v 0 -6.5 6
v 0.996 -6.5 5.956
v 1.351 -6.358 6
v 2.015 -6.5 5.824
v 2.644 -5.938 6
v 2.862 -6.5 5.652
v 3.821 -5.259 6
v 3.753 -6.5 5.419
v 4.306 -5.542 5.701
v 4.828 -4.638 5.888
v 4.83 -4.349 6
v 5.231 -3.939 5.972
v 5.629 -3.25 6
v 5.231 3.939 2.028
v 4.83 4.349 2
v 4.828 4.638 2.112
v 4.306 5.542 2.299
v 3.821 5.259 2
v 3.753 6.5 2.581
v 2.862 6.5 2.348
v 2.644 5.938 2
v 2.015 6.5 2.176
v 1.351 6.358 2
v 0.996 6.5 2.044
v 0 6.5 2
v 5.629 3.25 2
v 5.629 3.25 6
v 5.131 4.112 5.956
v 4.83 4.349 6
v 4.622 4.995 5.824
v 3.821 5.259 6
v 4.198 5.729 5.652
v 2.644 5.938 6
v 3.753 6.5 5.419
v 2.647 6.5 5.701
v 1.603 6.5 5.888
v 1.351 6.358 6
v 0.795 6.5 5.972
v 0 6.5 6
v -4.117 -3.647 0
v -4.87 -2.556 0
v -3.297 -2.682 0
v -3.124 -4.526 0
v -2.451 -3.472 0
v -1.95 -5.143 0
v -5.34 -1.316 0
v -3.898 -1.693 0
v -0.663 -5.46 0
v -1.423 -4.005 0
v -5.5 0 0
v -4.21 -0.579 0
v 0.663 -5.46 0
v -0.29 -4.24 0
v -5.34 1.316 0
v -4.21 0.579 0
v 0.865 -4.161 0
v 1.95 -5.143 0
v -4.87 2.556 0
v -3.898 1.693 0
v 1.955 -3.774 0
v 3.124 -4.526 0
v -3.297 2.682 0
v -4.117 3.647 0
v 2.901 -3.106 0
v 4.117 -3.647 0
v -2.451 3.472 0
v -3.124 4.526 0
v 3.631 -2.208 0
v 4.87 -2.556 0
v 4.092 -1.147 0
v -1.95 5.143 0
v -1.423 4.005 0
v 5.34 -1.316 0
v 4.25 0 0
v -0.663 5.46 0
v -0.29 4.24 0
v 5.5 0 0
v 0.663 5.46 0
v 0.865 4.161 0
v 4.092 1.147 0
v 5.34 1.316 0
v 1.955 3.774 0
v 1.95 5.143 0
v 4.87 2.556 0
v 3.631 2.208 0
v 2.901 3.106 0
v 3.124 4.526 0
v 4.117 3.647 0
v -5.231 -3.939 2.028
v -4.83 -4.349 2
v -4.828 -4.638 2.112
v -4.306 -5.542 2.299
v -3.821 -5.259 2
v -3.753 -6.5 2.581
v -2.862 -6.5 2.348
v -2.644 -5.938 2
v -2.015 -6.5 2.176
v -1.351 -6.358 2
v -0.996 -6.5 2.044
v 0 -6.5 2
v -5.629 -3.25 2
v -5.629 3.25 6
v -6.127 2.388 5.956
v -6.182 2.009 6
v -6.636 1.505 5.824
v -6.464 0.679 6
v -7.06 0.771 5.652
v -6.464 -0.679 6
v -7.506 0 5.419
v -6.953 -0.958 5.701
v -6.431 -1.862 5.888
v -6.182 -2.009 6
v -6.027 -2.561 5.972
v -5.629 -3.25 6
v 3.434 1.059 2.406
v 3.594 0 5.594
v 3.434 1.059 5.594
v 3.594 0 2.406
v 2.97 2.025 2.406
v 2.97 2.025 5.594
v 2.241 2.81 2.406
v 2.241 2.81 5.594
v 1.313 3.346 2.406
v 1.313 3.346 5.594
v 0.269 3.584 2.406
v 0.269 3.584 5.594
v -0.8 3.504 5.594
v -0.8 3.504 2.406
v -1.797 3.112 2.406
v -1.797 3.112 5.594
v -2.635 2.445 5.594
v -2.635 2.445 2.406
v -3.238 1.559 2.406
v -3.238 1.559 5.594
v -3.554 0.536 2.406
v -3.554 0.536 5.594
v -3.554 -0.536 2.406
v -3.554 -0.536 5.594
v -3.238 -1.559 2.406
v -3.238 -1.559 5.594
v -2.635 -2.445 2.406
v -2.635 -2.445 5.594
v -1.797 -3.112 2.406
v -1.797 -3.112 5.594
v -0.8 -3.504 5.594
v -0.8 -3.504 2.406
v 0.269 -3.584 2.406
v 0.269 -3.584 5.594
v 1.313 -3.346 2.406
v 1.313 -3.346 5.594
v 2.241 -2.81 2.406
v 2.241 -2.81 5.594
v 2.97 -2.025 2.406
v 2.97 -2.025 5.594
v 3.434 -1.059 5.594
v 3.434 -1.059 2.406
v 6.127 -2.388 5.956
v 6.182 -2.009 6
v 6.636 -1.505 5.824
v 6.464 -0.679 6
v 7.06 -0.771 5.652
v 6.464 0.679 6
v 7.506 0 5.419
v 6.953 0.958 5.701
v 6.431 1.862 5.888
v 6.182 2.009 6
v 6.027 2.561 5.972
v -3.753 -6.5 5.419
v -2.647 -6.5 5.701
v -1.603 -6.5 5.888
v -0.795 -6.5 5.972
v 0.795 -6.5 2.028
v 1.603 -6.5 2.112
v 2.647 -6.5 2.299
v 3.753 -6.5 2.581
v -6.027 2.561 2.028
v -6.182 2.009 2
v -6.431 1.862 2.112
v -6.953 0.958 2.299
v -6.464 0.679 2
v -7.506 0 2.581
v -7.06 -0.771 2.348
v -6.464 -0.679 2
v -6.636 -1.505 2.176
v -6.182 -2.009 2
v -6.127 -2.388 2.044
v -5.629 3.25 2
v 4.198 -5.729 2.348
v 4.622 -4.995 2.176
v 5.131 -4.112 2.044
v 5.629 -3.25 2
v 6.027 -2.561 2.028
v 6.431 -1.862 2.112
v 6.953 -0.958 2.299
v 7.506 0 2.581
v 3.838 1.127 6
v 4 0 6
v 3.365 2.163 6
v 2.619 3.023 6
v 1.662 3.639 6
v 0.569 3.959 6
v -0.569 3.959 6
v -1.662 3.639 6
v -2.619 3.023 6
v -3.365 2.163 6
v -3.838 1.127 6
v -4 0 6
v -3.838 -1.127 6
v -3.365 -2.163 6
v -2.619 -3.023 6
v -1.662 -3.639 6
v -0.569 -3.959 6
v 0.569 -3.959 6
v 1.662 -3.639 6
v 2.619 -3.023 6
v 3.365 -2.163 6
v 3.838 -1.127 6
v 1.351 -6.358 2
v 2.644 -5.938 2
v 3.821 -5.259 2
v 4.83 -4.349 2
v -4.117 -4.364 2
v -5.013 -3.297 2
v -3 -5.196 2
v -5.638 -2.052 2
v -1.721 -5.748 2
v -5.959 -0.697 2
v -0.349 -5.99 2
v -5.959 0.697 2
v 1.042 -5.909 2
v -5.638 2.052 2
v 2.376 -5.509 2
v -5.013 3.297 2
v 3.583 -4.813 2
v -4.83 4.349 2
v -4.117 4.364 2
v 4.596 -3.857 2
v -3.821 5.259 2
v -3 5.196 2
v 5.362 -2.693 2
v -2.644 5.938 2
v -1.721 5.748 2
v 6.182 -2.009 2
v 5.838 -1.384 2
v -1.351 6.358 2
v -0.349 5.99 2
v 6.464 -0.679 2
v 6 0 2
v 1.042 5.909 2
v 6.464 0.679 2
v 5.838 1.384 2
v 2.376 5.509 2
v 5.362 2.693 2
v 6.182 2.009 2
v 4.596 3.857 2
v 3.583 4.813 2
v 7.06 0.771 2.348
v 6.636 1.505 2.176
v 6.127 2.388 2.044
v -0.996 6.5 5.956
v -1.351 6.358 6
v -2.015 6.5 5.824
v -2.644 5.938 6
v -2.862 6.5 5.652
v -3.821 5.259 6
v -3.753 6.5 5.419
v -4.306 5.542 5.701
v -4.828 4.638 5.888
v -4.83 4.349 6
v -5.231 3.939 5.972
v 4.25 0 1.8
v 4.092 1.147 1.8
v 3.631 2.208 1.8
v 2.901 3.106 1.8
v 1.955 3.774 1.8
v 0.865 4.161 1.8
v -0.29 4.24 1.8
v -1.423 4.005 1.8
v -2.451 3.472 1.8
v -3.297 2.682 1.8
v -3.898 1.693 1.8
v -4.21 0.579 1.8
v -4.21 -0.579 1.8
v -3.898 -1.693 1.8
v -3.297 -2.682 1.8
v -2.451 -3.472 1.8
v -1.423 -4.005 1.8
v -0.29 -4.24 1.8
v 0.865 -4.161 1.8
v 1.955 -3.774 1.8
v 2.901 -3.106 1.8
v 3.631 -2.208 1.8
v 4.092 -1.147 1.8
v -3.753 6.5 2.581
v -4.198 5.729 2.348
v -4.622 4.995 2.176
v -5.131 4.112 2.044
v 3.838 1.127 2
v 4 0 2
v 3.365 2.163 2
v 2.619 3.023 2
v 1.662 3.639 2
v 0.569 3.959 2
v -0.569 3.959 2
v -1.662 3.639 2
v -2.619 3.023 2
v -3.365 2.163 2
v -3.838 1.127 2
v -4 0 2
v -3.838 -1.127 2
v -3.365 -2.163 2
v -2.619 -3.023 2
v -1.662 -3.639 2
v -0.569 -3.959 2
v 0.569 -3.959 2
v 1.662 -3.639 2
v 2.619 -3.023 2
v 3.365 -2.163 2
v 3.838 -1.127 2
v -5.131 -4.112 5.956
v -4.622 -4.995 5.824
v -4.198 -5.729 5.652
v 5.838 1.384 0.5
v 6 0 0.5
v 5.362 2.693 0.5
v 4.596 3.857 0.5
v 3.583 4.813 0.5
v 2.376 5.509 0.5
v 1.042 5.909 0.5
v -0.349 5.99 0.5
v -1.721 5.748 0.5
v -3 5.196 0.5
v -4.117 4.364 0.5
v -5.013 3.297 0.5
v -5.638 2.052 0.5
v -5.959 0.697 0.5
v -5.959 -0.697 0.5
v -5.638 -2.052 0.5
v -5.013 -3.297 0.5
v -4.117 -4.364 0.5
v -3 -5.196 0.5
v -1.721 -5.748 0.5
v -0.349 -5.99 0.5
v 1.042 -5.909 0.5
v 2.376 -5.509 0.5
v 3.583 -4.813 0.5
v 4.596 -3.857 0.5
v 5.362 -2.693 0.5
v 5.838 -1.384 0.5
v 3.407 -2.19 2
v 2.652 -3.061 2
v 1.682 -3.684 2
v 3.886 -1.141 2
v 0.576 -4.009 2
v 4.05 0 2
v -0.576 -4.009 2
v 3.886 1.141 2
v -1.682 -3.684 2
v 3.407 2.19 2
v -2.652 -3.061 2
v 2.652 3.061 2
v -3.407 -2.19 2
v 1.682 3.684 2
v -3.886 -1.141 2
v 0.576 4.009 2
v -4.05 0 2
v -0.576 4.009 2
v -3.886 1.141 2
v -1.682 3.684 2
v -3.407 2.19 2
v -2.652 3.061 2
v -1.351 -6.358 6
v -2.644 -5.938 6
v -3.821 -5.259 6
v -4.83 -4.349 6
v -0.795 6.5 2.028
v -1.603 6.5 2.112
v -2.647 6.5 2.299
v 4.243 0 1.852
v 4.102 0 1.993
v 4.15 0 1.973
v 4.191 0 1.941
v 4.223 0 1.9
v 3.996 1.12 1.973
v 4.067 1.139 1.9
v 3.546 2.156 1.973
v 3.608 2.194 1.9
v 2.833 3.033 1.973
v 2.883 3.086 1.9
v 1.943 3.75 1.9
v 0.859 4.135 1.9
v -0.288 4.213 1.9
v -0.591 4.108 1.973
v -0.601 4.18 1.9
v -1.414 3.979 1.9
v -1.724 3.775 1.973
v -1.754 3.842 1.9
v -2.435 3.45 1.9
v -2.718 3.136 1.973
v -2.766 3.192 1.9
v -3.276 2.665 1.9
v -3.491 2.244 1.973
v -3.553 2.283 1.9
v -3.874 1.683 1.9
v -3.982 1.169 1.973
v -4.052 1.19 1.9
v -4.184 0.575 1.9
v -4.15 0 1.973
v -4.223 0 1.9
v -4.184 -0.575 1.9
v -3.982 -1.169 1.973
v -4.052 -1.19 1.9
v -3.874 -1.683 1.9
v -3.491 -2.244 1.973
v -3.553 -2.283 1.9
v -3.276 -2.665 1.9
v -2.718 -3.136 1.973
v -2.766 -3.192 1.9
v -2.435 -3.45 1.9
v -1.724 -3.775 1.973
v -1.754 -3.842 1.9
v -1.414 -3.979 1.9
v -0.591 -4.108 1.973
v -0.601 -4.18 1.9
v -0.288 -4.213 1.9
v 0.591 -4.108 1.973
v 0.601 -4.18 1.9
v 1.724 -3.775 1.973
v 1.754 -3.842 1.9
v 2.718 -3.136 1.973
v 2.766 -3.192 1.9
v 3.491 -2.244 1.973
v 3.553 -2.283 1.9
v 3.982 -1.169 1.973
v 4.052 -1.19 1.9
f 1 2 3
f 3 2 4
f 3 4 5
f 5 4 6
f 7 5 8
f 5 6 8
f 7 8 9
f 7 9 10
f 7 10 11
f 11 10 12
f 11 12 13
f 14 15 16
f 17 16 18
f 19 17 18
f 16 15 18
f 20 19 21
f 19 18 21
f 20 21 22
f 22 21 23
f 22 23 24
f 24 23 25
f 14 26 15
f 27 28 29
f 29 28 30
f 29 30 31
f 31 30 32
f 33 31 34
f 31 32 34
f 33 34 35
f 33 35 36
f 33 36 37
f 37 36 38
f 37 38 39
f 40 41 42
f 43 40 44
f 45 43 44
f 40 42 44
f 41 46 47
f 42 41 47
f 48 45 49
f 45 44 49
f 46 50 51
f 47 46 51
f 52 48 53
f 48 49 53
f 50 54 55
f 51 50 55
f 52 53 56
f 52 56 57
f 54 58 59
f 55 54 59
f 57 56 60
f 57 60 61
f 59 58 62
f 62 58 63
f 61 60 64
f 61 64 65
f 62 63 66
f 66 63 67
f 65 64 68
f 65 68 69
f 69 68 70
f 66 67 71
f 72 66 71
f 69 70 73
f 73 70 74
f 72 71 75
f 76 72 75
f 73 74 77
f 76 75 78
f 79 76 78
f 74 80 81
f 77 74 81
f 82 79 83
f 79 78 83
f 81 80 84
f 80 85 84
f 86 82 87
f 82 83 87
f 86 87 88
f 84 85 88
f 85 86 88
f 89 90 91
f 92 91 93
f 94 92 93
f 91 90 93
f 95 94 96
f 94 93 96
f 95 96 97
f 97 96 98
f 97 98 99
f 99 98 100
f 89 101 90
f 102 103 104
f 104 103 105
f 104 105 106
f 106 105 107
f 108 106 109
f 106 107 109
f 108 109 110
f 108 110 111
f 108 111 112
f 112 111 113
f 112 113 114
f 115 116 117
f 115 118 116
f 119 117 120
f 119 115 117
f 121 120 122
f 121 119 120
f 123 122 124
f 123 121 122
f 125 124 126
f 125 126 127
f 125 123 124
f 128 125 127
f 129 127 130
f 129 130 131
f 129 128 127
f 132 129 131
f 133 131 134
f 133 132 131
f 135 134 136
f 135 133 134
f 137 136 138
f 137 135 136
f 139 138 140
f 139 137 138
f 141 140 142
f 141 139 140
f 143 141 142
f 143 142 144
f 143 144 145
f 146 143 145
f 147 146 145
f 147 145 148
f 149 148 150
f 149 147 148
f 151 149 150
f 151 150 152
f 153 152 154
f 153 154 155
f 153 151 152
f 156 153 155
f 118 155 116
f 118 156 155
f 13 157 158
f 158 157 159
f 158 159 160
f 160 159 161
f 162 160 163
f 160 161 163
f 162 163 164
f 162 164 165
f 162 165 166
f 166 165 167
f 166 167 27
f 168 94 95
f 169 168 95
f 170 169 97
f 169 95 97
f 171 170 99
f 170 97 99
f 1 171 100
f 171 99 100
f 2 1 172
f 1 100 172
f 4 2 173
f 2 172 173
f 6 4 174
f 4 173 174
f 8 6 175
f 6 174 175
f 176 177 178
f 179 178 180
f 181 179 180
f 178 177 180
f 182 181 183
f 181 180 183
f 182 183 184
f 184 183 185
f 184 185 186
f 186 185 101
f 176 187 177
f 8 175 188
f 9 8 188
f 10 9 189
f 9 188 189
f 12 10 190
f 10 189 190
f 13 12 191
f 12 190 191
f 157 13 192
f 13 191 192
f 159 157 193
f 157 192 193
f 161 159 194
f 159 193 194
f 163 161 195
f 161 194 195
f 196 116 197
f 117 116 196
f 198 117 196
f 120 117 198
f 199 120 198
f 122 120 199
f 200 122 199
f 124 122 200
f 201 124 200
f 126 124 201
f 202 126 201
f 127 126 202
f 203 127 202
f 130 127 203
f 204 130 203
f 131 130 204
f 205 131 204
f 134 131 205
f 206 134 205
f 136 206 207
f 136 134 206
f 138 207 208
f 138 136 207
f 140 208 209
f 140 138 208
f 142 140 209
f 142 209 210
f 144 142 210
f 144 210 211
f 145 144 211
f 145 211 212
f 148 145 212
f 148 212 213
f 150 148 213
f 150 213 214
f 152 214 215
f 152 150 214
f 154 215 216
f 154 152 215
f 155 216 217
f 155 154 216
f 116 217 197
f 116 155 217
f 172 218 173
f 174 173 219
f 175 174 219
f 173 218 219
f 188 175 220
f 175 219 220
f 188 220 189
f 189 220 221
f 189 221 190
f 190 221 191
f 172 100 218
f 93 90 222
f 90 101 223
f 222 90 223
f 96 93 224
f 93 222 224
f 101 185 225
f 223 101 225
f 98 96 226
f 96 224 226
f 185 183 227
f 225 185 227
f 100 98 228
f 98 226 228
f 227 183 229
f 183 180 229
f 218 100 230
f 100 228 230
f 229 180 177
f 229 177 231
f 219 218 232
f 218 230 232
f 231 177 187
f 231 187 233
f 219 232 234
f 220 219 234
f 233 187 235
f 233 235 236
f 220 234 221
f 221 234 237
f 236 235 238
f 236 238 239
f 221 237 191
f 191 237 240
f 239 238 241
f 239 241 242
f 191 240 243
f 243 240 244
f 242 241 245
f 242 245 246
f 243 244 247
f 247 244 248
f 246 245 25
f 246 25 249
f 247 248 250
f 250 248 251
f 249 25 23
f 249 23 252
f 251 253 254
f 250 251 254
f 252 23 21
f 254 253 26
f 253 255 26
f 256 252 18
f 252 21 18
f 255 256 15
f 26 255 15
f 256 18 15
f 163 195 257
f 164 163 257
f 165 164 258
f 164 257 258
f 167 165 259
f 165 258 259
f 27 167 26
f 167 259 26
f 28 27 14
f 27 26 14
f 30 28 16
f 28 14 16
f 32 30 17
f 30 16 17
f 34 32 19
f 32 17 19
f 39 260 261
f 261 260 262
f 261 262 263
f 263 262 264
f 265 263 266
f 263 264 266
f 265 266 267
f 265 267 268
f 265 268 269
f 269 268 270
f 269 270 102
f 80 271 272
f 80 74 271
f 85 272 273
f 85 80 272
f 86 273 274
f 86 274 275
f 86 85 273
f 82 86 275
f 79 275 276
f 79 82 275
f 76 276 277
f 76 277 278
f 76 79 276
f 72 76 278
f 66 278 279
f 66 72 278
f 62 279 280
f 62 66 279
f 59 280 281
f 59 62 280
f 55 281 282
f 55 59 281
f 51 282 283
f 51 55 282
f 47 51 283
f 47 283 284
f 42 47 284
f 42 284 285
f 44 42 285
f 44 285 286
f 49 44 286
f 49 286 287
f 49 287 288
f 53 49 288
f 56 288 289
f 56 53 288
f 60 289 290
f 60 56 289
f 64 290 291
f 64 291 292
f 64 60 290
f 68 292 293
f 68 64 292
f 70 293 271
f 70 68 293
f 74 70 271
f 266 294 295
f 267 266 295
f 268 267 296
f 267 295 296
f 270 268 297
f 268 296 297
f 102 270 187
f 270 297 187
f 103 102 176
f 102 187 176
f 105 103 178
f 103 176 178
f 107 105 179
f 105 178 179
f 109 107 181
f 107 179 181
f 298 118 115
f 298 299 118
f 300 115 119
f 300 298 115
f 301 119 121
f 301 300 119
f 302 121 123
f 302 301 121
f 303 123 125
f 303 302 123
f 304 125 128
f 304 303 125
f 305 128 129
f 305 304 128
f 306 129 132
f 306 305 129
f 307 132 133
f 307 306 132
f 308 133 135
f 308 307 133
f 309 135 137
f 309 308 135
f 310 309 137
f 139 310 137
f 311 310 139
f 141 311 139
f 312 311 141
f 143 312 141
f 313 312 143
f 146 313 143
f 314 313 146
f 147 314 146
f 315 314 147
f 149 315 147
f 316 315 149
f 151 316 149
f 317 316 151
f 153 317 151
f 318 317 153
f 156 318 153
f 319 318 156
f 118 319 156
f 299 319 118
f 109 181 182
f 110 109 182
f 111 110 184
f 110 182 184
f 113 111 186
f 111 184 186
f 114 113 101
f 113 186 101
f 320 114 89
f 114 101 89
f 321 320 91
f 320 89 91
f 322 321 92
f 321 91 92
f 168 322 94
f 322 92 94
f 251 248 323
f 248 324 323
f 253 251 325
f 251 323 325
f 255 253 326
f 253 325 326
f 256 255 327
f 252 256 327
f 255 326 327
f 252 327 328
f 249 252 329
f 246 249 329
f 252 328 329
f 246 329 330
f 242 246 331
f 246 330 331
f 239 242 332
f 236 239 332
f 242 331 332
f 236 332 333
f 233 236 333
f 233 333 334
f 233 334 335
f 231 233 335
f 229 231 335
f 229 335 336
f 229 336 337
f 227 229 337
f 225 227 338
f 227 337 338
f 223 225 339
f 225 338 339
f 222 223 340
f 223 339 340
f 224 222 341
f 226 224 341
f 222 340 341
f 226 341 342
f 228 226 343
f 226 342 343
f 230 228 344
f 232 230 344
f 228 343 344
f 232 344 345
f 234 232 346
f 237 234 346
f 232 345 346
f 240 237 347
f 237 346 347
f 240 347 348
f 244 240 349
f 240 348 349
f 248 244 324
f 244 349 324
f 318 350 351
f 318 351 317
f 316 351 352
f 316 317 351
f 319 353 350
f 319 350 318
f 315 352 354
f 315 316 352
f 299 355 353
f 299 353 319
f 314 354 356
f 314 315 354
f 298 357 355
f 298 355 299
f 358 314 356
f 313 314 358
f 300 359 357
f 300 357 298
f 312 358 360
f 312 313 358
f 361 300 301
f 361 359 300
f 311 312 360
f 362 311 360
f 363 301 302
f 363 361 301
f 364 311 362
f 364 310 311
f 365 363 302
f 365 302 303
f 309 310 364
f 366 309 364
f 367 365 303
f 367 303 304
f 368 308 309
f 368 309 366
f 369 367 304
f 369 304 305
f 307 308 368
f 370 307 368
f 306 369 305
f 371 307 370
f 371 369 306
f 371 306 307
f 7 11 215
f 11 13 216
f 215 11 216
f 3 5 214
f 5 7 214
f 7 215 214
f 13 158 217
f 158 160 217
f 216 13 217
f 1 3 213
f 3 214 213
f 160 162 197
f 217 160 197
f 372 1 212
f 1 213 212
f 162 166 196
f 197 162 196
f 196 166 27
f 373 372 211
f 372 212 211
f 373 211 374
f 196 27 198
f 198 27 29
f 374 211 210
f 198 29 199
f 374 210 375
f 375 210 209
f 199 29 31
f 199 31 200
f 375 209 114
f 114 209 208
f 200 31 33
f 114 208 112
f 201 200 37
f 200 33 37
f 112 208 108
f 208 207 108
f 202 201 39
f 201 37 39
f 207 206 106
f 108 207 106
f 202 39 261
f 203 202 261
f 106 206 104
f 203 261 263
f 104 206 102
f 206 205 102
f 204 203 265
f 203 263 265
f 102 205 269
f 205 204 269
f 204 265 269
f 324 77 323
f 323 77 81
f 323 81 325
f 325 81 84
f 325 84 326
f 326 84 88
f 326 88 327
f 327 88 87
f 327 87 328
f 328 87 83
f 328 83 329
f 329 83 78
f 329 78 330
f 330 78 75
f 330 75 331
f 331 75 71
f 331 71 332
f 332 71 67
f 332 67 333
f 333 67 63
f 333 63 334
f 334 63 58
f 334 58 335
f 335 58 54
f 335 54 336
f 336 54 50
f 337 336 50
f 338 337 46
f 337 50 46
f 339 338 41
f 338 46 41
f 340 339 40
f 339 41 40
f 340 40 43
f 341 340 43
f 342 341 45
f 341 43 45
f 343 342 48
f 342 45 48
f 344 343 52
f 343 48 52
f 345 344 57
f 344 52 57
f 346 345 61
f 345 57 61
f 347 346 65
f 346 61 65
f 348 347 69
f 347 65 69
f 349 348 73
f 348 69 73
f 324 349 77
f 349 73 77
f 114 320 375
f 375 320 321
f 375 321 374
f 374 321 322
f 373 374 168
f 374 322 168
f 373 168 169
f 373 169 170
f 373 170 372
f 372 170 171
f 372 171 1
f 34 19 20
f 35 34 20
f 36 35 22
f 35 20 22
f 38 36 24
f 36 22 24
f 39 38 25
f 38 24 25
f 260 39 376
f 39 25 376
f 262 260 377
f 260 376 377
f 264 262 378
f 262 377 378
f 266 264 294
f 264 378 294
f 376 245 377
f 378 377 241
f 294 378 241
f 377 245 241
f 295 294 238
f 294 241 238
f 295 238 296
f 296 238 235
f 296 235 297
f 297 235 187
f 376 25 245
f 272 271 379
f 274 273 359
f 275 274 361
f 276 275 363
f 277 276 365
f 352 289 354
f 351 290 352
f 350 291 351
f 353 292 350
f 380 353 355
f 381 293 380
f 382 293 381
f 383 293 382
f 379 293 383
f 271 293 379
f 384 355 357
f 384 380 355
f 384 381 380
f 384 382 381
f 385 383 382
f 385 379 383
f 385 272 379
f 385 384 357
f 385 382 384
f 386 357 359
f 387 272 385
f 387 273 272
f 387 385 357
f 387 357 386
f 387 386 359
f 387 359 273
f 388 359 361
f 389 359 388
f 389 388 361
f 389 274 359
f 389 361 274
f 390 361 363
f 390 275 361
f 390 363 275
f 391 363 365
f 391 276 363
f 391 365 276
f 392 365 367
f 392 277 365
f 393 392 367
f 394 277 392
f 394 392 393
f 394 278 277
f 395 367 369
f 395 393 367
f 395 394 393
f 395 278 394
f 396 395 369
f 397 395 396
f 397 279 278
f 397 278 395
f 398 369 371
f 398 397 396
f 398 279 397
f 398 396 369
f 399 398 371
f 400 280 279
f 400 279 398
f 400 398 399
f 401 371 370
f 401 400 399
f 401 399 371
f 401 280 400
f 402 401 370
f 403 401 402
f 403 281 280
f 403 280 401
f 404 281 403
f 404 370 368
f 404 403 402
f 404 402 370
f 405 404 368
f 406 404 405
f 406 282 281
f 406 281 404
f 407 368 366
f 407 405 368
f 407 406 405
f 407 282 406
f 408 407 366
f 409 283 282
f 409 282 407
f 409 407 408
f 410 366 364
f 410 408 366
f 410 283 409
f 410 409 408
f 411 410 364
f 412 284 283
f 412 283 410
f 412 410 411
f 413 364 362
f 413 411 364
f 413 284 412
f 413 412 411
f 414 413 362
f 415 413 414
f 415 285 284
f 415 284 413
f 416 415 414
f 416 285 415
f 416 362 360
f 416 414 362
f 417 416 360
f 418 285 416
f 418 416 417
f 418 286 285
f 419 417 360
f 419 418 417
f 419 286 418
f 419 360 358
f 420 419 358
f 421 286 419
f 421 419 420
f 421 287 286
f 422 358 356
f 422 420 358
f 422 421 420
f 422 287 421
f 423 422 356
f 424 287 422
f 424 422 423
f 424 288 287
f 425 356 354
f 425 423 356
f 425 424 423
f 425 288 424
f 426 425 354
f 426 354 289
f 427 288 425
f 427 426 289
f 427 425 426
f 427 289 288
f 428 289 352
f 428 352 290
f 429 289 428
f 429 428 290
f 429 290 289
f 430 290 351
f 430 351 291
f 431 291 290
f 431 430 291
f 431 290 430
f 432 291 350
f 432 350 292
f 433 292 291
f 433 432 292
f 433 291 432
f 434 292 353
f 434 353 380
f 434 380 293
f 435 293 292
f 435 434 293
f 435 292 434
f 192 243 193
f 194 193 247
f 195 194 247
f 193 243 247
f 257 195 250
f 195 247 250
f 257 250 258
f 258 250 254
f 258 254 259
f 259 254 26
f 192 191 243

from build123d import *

# Parameters (mm, degrees)
SKETCH3_W          = 26
SKETCH3_H          = 26
CUT_EXTRUDE1_DEPTH = 6


with BuildPart() as part:
    # Sketch1 → Revolve1 (revolve)
    with BuildSketch(Plane(origin=(0, 0, 0), x_dir=(0, 0, -1), z_dir=(1, 0, 0))):
        Polygon((-6, 0), (-6, 6.5), (-5.24944465, 7.8), (-2.75055535, 7.8), (-2, 6.5), (-2, 6), (-0.5, 6), (0, 5.5), (0, 0), align=None)
    revolve(axis=Axis((0, 0, 0), (0, 0, 1)))

    # Sketch2 → Cut-Revolve1 (revolve, cut)
    with BuildSketch(Plane(origin=(0, 0, 0), x_dir=(0, 0, -1), z_dir=(1, 0, 0))):
        with BuildLine():
            Line((-6, 0), (-6, 4))
            Line((-6, 4), (-5.594, 3.594))
            Line((-5.594, 3.594), (-2.406, 3.594))
            Line((-2.406, 3.594), (-2, 4))
            Line((-2, 4), (-2, 4.05))
            ThreePointArc((-2, 4.05), (-1.941421356, 4.191421356), (-1.8, 4.25))
            Line((-1.8, 4.25), (0, 4.25))
            Line((0, 4.25), (0, 0))
            Line((0, 0), (-6, 0))
        make_face()
    revolve(axis=Axis((0, 0, 0), (0, 0, 1)), mode=Mode.SUBTRACT)

    # Sketch3 → Cut-Extrude1 (cut)
    with BuildSketch(Plane.XY):
        Rectangle(SKETCH3_W, SKETCH3_H)
        Polygon((-7.505553499, 0), (-3.75277675, -6.5), (3.75277675, -6.5), (7.505553499, 0), (3.75277675, 6.5), (-3.75277675, 6.5), align=None, mode=Mode.SUBTRACT)
    extrude(amount=CUT_EXTRUDE1_DEPTH, mode=Mode.SUBTRACT)


solid = part.part
